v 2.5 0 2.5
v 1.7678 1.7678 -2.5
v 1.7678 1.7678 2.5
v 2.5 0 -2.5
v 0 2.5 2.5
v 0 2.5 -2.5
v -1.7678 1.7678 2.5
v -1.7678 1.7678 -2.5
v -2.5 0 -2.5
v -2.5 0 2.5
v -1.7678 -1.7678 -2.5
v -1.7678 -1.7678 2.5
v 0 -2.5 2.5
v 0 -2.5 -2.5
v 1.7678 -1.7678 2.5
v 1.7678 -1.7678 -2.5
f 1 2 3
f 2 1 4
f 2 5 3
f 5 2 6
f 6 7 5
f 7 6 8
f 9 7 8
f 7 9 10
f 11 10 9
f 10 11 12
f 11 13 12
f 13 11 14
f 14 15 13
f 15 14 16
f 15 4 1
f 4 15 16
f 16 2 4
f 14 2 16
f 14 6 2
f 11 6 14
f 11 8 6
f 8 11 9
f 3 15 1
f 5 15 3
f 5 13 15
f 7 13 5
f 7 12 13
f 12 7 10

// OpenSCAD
// Parameters
length = 15; //[8:30:1]
forced_id = 0; //[0:10:1]
center = 1; //[0:1:1]
type_id_nominal = 3; //[1:12:1]
type_od_nominal = 5; //[2:20:1]
eps_overlap = 1; //[0.5:2:0.1]

// Tubing - complete geometry
module tubing() {
  color([0.85, 0.85, 0.8]) { // Off-white for heatshrink
    difference() {
      // Outer sleeve
      cylinder(
        r=((type_od_nominal + ((forced_id > 0) * forced_id + (forced_id <= 0) * type_id_nominal) - type_id_nominal)) / 2,
        h=length + eps_overlap,
        center=true
      );
      // Inner bore
      cylinder(
        r=(((forced_id > 0) * forced_id + (forced_id <= 0) * type_id_nominal) / 2),
        h=length + 2 * eps_overlap,
        center=true
      );
    }
  }
}

// Sleeved Resistor - placeholder geometry
module sleeved_resistor() {
  color([0.2, 0.2, 0.2]) { // Dark color for resistor
    // Placeholder for resistor
    translate([0, 0, 0]) cylinder(r=2.5, h=5, center=true);
  }
}

// Assembly
module assembly() {
  tubing();
  translate([0, 0, 0]) sleeved_resistor();
}

assembly();
